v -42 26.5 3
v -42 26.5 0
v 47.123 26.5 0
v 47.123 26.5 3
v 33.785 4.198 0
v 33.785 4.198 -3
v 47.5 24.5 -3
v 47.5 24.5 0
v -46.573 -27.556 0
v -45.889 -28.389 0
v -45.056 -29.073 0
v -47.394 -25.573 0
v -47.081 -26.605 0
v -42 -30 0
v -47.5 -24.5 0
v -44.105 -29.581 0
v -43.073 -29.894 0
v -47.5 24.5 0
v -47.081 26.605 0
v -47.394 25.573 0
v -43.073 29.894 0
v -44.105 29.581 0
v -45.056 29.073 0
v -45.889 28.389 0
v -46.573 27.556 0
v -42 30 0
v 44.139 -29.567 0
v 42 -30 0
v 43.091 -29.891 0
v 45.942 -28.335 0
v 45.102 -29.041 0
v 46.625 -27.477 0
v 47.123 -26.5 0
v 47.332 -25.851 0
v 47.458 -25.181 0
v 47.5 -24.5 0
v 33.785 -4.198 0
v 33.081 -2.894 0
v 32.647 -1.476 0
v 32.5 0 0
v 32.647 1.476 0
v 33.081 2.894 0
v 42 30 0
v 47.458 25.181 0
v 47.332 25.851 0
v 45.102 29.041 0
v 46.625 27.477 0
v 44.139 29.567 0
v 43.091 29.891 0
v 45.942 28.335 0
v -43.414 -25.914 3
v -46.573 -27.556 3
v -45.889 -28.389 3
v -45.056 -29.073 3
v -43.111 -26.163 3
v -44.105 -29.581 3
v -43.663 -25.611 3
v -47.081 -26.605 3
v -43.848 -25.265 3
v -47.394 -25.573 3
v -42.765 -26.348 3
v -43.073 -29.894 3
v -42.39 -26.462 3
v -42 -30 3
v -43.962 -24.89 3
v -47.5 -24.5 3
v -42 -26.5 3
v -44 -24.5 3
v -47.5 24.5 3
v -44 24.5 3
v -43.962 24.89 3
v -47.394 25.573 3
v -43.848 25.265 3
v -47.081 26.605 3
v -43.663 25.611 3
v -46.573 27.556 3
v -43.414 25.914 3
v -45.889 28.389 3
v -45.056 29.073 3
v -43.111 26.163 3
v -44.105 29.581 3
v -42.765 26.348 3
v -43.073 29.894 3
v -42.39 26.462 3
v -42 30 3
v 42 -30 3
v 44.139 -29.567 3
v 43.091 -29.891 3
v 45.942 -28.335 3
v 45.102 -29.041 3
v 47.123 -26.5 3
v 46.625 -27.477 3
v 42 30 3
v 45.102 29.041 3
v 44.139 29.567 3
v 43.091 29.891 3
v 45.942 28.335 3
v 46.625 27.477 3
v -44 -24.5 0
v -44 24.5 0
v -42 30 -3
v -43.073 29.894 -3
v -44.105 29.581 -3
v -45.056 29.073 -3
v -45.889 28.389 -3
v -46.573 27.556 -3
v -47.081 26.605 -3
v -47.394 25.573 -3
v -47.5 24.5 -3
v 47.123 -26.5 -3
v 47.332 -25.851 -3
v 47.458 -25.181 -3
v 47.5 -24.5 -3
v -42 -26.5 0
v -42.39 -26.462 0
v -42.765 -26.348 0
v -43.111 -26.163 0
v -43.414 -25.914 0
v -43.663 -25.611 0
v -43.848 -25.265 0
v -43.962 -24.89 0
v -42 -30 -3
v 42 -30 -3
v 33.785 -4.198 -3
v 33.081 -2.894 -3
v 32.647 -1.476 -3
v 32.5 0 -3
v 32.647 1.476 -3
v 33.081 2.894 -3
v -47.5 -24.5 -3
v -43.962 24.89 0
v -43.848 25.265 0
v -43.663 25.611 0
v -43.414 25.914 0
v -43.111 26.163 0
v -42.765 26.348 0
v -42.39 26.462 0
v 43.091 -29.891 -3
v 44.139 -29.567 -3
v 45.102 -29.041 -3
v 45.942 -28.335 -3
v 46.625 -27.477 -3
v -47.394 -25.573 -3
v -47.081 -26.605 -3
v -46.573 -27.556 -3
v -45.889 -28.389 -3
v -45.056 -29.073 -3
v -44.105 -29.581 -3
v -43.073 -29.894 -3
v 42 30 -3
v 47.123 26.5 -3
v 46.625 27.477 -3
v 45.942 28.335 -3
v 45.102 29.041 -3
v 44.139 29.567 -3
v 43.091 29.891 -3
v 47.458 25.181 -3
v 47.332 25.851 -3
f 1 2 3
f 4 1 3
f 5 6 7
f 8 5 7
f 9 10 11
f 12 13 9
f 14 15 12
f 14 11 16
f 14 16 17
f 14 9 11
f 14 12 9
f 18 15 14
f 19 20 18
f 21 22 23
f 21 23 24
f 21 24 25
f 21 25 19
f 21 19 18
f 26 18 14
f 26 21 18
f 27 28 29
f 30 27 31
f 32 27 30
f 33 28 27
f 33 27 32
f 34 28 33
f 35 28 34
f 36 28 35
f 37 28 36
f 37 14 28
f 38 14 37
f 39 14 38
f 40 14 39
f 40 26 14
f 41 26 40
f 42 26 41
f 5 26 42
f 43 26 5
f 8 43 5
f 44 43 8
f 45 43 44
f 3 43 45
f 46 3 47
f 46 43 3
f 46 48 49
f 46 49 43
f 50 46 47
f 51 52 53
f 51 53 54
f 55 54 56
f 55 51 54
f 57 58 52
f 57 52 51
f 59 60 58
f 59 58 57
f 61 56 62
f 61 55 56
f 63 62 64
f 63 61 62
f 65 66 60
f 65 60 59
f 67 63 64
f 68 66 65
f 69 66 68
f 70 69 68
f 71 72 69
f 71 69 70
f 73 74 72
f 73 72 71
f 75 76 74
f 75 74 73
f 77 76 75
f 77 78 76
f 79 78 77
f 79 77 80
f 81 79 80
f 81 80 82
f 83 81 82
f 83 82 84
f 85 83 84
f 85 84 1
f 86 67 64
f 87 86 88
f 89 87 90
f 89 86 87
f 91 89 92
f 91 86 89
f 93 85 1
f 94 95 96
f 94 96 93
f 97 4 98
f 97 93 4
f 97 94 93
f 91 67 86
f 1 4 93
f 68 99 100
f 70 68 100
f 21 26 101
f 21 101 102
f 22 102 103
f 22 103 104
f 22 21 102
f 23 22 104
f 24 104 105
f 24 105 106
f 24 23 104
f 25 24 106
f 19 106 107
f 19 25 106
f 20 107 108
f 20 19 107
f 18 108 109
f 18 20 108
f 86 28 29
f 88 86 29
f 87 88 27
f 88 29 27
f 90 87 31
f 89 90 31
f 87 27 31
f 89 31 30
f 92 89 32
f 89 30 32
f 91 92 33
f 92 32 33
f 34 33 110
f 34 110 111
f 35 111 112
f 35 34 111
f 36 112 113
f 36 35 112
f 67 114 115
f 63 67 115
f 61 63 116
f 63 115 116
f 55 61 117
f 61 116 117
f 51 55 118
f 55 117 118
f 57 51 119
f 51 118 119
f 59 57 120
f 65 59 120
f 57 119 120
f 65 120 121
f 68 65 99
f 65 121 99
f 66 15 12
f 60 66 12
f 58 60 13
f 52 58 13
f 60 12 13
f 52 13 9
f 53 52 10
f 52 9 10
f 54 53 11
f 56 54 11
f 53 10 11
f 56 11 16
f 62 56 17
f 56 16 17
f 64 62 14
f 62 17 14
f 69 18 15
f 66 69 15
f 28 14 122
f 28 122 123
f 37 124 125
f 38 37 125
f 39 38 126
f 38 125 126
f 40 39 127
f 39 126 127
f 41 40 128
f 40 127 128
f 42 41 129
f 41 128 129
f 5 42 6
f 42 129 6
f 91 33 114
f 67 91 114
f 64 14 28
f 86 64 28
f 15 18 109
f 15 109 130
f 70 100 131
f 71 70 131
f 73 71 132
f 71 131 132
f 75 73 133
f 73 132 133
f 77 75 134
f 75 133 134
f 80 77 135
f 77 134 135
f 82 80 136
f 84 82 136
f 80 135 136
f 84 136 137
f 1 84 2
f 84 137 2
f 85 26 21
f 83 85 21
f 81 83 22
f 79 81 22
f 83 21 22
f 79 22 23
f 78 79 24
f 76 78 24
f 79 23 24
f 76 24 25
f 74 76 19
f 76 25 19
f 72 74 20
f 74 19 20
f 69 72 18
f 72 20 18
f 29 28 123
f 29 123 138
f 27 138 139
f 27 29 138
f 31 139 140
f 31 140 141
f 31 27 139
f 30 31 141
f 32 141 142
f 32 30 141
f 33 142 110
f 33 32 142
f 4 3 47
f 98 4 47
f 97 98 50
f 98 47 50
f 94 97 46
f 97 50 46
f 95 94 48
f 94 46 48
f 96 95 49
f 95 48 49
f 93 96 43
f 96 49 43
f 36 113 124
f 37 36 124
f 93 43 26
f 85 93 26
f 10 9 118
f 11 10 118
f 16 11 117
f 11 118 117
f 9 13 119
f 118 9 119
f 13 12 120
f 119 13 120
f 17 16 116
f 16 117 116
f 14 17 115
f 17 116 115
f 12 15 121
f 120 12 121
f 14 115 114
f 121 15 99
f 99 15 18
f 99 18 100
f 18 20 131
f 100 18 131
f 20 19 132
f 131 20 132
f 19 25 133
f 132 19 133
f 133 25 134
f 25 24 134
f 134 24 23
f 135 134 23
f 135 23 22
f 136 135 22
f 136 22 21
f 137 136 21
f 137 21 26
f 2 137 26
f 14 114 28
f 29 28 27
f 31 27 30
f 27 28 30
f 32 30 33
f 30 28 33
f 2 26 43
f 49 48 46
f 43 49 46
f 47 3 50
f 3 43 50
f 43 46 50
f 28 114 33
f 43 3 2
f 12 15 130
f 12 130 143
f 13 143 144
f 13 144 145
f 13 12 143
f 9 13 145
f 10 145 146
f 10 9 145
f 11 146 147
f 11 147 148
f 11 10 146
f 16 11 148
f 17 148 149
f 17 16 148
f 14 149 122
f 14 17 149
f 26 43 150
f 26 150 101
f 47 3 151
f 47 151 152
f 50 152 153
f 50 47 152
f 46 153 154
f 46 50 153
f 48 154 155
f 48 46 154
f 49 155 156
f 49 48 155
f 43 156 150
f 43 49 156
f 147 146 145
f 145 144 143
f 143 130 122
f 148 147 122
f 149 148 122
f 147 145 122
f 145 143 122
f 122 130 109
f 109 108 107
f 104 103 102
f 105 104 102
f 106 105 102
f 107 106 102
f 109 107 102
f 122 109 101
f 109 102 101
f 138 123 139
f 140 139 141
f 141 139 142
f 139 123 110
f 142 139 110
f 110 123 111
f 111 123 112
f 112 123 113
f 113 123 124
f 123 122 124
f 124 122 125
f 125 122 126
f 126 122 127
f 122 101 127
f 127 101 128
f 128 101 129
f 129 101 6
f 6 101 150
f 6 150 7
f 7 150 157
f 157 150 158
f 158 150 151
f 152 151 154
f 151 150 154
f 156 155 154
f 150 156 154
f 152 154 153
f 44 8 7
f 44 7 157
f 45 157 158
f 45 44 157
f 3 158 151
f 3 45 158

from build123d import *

# Parameters (mm, degrees)
F1_DEPTH = 3
F2_DEPTH = 3
F4_DEPTH = 25


with BuildPart() as f1:
    # F0 (on Top) → F1 (new body)
    with BuildSketch(Plane.XY):
        with BuildLine():
            Line((-42, -30), (42, -30))
            ThreePointArc((42, -30), (45.102418, -29.041476), (47.123475, -26.5))
            Line((47.123475, -26.5), (-42, -26.5))
            ThreePointArc((-42, -26.5), (-43.414214, -25.914214), (-44, -24.5))
            Line((-44, -24.5), (-44, 24.5))
            ThreePointArc((-44, 24.5), (-43.414214, 25.914214), (-42, 26.5))
            Line((-42, 26.5), (47.123475, 26.5))
            ThreePointArc((47.123475, 26.5), (45.102418, 29.041476), (42, 30))
            Line((42, 30), (-42, 30))
            ThreePointArc((-42, 30), (-45.889087, 28.389087), (-47.5, 24.5))
            Line((-47.5, 24.5), (-47.5, -24.5))
            ThreePointArc((-47.5, -24.5), (-45.889087, -28.389087), (-42, -30))
        make_face()
        with BuildLine():
            Line((-42, -26.5), (47.123475, -26.5))
            ThreePointArc((47.123475, -26.5), (47.405049, -25.517567), (47.5, -24.5))
            Line((47.5, -24.5), (47.5, 24.5))
            ThreePointArc((47.5, 24.5), (47.405049, 25.517567), (47.123475, 26.5))
            Line((47.123475, 26.5), (-42, 26.5))
            ThreePointArc((-42, 26.5), (-43.414214, 25.914214), (-44, 24.5))
            Line((-44, 24.5), (-44, -24.5))
            ThreePointArc((-44, -24.5), (-43.414214, -25.914214), (-42, -26.5))
        make_face()
    extrude(amount=-F1_DEPTH)

    # F3 (on face) → F4 (cut)
    with BuildSketch(Plane(origin=(0, 0, -3), x_dir=(1, 0, 0), z_dir=(0, 0, -1))):
        with BuildLine():
            Line((47.5, 24.5), (33.785225, 4.198401))
            ThreePointArc((33.785225, 4.198401), (32.5, 0), (33.785225, -4.198401))
            Line((33.785225, -4.198401), (47.5, -24.5))
            Line((47.5, -24.5), (47.5, 24.5))
        make_face()
    extrude(amount=-F4_DEPTH, mode=Mode.SUBTRACT)


with BuildPart() as f2:
    # F0 (on Top) → F2 (new body)
    with BuildSketch(Plane.XY):
        with BuildLine():
            Line((-42, -30), (42, -30))
            ThreePointArc((42, -30), (45.102418, -29.041476), (47.123475, -26.5))
            Line((47.123475, -26.5), (-42, -26.5))
            ThreePointArc((-42, -26.5), (-43.414214, -25.914214), (-44, -24.5))
            Line((-44, -24.5), (-44, 24.5))
            ThreePointArc((-44, 24.5), (-43.414214, 25.914214), (-42, 26.5))
            Line((-42, 26.5), (47.123475, 26.5))
            ThreePointArc((47.123475, 26.5), (45.102418, 29.041476), (42, 30))
            Line((42, 30), (-42, 30))
            ThreePointArc((-42, 30), (-45.889087, 28.389087), (-47.5, 24.5))
            Line((-47.5, 24.5), (-47.5, -24.5))
            ThreePointArc((-47.5, -24.5), (-45.889087, -28.389087), (-42, -30))
        make_face()
    extrude(amount=F2_DEPTH)


solid = Compound([f1.part, f2.part])
